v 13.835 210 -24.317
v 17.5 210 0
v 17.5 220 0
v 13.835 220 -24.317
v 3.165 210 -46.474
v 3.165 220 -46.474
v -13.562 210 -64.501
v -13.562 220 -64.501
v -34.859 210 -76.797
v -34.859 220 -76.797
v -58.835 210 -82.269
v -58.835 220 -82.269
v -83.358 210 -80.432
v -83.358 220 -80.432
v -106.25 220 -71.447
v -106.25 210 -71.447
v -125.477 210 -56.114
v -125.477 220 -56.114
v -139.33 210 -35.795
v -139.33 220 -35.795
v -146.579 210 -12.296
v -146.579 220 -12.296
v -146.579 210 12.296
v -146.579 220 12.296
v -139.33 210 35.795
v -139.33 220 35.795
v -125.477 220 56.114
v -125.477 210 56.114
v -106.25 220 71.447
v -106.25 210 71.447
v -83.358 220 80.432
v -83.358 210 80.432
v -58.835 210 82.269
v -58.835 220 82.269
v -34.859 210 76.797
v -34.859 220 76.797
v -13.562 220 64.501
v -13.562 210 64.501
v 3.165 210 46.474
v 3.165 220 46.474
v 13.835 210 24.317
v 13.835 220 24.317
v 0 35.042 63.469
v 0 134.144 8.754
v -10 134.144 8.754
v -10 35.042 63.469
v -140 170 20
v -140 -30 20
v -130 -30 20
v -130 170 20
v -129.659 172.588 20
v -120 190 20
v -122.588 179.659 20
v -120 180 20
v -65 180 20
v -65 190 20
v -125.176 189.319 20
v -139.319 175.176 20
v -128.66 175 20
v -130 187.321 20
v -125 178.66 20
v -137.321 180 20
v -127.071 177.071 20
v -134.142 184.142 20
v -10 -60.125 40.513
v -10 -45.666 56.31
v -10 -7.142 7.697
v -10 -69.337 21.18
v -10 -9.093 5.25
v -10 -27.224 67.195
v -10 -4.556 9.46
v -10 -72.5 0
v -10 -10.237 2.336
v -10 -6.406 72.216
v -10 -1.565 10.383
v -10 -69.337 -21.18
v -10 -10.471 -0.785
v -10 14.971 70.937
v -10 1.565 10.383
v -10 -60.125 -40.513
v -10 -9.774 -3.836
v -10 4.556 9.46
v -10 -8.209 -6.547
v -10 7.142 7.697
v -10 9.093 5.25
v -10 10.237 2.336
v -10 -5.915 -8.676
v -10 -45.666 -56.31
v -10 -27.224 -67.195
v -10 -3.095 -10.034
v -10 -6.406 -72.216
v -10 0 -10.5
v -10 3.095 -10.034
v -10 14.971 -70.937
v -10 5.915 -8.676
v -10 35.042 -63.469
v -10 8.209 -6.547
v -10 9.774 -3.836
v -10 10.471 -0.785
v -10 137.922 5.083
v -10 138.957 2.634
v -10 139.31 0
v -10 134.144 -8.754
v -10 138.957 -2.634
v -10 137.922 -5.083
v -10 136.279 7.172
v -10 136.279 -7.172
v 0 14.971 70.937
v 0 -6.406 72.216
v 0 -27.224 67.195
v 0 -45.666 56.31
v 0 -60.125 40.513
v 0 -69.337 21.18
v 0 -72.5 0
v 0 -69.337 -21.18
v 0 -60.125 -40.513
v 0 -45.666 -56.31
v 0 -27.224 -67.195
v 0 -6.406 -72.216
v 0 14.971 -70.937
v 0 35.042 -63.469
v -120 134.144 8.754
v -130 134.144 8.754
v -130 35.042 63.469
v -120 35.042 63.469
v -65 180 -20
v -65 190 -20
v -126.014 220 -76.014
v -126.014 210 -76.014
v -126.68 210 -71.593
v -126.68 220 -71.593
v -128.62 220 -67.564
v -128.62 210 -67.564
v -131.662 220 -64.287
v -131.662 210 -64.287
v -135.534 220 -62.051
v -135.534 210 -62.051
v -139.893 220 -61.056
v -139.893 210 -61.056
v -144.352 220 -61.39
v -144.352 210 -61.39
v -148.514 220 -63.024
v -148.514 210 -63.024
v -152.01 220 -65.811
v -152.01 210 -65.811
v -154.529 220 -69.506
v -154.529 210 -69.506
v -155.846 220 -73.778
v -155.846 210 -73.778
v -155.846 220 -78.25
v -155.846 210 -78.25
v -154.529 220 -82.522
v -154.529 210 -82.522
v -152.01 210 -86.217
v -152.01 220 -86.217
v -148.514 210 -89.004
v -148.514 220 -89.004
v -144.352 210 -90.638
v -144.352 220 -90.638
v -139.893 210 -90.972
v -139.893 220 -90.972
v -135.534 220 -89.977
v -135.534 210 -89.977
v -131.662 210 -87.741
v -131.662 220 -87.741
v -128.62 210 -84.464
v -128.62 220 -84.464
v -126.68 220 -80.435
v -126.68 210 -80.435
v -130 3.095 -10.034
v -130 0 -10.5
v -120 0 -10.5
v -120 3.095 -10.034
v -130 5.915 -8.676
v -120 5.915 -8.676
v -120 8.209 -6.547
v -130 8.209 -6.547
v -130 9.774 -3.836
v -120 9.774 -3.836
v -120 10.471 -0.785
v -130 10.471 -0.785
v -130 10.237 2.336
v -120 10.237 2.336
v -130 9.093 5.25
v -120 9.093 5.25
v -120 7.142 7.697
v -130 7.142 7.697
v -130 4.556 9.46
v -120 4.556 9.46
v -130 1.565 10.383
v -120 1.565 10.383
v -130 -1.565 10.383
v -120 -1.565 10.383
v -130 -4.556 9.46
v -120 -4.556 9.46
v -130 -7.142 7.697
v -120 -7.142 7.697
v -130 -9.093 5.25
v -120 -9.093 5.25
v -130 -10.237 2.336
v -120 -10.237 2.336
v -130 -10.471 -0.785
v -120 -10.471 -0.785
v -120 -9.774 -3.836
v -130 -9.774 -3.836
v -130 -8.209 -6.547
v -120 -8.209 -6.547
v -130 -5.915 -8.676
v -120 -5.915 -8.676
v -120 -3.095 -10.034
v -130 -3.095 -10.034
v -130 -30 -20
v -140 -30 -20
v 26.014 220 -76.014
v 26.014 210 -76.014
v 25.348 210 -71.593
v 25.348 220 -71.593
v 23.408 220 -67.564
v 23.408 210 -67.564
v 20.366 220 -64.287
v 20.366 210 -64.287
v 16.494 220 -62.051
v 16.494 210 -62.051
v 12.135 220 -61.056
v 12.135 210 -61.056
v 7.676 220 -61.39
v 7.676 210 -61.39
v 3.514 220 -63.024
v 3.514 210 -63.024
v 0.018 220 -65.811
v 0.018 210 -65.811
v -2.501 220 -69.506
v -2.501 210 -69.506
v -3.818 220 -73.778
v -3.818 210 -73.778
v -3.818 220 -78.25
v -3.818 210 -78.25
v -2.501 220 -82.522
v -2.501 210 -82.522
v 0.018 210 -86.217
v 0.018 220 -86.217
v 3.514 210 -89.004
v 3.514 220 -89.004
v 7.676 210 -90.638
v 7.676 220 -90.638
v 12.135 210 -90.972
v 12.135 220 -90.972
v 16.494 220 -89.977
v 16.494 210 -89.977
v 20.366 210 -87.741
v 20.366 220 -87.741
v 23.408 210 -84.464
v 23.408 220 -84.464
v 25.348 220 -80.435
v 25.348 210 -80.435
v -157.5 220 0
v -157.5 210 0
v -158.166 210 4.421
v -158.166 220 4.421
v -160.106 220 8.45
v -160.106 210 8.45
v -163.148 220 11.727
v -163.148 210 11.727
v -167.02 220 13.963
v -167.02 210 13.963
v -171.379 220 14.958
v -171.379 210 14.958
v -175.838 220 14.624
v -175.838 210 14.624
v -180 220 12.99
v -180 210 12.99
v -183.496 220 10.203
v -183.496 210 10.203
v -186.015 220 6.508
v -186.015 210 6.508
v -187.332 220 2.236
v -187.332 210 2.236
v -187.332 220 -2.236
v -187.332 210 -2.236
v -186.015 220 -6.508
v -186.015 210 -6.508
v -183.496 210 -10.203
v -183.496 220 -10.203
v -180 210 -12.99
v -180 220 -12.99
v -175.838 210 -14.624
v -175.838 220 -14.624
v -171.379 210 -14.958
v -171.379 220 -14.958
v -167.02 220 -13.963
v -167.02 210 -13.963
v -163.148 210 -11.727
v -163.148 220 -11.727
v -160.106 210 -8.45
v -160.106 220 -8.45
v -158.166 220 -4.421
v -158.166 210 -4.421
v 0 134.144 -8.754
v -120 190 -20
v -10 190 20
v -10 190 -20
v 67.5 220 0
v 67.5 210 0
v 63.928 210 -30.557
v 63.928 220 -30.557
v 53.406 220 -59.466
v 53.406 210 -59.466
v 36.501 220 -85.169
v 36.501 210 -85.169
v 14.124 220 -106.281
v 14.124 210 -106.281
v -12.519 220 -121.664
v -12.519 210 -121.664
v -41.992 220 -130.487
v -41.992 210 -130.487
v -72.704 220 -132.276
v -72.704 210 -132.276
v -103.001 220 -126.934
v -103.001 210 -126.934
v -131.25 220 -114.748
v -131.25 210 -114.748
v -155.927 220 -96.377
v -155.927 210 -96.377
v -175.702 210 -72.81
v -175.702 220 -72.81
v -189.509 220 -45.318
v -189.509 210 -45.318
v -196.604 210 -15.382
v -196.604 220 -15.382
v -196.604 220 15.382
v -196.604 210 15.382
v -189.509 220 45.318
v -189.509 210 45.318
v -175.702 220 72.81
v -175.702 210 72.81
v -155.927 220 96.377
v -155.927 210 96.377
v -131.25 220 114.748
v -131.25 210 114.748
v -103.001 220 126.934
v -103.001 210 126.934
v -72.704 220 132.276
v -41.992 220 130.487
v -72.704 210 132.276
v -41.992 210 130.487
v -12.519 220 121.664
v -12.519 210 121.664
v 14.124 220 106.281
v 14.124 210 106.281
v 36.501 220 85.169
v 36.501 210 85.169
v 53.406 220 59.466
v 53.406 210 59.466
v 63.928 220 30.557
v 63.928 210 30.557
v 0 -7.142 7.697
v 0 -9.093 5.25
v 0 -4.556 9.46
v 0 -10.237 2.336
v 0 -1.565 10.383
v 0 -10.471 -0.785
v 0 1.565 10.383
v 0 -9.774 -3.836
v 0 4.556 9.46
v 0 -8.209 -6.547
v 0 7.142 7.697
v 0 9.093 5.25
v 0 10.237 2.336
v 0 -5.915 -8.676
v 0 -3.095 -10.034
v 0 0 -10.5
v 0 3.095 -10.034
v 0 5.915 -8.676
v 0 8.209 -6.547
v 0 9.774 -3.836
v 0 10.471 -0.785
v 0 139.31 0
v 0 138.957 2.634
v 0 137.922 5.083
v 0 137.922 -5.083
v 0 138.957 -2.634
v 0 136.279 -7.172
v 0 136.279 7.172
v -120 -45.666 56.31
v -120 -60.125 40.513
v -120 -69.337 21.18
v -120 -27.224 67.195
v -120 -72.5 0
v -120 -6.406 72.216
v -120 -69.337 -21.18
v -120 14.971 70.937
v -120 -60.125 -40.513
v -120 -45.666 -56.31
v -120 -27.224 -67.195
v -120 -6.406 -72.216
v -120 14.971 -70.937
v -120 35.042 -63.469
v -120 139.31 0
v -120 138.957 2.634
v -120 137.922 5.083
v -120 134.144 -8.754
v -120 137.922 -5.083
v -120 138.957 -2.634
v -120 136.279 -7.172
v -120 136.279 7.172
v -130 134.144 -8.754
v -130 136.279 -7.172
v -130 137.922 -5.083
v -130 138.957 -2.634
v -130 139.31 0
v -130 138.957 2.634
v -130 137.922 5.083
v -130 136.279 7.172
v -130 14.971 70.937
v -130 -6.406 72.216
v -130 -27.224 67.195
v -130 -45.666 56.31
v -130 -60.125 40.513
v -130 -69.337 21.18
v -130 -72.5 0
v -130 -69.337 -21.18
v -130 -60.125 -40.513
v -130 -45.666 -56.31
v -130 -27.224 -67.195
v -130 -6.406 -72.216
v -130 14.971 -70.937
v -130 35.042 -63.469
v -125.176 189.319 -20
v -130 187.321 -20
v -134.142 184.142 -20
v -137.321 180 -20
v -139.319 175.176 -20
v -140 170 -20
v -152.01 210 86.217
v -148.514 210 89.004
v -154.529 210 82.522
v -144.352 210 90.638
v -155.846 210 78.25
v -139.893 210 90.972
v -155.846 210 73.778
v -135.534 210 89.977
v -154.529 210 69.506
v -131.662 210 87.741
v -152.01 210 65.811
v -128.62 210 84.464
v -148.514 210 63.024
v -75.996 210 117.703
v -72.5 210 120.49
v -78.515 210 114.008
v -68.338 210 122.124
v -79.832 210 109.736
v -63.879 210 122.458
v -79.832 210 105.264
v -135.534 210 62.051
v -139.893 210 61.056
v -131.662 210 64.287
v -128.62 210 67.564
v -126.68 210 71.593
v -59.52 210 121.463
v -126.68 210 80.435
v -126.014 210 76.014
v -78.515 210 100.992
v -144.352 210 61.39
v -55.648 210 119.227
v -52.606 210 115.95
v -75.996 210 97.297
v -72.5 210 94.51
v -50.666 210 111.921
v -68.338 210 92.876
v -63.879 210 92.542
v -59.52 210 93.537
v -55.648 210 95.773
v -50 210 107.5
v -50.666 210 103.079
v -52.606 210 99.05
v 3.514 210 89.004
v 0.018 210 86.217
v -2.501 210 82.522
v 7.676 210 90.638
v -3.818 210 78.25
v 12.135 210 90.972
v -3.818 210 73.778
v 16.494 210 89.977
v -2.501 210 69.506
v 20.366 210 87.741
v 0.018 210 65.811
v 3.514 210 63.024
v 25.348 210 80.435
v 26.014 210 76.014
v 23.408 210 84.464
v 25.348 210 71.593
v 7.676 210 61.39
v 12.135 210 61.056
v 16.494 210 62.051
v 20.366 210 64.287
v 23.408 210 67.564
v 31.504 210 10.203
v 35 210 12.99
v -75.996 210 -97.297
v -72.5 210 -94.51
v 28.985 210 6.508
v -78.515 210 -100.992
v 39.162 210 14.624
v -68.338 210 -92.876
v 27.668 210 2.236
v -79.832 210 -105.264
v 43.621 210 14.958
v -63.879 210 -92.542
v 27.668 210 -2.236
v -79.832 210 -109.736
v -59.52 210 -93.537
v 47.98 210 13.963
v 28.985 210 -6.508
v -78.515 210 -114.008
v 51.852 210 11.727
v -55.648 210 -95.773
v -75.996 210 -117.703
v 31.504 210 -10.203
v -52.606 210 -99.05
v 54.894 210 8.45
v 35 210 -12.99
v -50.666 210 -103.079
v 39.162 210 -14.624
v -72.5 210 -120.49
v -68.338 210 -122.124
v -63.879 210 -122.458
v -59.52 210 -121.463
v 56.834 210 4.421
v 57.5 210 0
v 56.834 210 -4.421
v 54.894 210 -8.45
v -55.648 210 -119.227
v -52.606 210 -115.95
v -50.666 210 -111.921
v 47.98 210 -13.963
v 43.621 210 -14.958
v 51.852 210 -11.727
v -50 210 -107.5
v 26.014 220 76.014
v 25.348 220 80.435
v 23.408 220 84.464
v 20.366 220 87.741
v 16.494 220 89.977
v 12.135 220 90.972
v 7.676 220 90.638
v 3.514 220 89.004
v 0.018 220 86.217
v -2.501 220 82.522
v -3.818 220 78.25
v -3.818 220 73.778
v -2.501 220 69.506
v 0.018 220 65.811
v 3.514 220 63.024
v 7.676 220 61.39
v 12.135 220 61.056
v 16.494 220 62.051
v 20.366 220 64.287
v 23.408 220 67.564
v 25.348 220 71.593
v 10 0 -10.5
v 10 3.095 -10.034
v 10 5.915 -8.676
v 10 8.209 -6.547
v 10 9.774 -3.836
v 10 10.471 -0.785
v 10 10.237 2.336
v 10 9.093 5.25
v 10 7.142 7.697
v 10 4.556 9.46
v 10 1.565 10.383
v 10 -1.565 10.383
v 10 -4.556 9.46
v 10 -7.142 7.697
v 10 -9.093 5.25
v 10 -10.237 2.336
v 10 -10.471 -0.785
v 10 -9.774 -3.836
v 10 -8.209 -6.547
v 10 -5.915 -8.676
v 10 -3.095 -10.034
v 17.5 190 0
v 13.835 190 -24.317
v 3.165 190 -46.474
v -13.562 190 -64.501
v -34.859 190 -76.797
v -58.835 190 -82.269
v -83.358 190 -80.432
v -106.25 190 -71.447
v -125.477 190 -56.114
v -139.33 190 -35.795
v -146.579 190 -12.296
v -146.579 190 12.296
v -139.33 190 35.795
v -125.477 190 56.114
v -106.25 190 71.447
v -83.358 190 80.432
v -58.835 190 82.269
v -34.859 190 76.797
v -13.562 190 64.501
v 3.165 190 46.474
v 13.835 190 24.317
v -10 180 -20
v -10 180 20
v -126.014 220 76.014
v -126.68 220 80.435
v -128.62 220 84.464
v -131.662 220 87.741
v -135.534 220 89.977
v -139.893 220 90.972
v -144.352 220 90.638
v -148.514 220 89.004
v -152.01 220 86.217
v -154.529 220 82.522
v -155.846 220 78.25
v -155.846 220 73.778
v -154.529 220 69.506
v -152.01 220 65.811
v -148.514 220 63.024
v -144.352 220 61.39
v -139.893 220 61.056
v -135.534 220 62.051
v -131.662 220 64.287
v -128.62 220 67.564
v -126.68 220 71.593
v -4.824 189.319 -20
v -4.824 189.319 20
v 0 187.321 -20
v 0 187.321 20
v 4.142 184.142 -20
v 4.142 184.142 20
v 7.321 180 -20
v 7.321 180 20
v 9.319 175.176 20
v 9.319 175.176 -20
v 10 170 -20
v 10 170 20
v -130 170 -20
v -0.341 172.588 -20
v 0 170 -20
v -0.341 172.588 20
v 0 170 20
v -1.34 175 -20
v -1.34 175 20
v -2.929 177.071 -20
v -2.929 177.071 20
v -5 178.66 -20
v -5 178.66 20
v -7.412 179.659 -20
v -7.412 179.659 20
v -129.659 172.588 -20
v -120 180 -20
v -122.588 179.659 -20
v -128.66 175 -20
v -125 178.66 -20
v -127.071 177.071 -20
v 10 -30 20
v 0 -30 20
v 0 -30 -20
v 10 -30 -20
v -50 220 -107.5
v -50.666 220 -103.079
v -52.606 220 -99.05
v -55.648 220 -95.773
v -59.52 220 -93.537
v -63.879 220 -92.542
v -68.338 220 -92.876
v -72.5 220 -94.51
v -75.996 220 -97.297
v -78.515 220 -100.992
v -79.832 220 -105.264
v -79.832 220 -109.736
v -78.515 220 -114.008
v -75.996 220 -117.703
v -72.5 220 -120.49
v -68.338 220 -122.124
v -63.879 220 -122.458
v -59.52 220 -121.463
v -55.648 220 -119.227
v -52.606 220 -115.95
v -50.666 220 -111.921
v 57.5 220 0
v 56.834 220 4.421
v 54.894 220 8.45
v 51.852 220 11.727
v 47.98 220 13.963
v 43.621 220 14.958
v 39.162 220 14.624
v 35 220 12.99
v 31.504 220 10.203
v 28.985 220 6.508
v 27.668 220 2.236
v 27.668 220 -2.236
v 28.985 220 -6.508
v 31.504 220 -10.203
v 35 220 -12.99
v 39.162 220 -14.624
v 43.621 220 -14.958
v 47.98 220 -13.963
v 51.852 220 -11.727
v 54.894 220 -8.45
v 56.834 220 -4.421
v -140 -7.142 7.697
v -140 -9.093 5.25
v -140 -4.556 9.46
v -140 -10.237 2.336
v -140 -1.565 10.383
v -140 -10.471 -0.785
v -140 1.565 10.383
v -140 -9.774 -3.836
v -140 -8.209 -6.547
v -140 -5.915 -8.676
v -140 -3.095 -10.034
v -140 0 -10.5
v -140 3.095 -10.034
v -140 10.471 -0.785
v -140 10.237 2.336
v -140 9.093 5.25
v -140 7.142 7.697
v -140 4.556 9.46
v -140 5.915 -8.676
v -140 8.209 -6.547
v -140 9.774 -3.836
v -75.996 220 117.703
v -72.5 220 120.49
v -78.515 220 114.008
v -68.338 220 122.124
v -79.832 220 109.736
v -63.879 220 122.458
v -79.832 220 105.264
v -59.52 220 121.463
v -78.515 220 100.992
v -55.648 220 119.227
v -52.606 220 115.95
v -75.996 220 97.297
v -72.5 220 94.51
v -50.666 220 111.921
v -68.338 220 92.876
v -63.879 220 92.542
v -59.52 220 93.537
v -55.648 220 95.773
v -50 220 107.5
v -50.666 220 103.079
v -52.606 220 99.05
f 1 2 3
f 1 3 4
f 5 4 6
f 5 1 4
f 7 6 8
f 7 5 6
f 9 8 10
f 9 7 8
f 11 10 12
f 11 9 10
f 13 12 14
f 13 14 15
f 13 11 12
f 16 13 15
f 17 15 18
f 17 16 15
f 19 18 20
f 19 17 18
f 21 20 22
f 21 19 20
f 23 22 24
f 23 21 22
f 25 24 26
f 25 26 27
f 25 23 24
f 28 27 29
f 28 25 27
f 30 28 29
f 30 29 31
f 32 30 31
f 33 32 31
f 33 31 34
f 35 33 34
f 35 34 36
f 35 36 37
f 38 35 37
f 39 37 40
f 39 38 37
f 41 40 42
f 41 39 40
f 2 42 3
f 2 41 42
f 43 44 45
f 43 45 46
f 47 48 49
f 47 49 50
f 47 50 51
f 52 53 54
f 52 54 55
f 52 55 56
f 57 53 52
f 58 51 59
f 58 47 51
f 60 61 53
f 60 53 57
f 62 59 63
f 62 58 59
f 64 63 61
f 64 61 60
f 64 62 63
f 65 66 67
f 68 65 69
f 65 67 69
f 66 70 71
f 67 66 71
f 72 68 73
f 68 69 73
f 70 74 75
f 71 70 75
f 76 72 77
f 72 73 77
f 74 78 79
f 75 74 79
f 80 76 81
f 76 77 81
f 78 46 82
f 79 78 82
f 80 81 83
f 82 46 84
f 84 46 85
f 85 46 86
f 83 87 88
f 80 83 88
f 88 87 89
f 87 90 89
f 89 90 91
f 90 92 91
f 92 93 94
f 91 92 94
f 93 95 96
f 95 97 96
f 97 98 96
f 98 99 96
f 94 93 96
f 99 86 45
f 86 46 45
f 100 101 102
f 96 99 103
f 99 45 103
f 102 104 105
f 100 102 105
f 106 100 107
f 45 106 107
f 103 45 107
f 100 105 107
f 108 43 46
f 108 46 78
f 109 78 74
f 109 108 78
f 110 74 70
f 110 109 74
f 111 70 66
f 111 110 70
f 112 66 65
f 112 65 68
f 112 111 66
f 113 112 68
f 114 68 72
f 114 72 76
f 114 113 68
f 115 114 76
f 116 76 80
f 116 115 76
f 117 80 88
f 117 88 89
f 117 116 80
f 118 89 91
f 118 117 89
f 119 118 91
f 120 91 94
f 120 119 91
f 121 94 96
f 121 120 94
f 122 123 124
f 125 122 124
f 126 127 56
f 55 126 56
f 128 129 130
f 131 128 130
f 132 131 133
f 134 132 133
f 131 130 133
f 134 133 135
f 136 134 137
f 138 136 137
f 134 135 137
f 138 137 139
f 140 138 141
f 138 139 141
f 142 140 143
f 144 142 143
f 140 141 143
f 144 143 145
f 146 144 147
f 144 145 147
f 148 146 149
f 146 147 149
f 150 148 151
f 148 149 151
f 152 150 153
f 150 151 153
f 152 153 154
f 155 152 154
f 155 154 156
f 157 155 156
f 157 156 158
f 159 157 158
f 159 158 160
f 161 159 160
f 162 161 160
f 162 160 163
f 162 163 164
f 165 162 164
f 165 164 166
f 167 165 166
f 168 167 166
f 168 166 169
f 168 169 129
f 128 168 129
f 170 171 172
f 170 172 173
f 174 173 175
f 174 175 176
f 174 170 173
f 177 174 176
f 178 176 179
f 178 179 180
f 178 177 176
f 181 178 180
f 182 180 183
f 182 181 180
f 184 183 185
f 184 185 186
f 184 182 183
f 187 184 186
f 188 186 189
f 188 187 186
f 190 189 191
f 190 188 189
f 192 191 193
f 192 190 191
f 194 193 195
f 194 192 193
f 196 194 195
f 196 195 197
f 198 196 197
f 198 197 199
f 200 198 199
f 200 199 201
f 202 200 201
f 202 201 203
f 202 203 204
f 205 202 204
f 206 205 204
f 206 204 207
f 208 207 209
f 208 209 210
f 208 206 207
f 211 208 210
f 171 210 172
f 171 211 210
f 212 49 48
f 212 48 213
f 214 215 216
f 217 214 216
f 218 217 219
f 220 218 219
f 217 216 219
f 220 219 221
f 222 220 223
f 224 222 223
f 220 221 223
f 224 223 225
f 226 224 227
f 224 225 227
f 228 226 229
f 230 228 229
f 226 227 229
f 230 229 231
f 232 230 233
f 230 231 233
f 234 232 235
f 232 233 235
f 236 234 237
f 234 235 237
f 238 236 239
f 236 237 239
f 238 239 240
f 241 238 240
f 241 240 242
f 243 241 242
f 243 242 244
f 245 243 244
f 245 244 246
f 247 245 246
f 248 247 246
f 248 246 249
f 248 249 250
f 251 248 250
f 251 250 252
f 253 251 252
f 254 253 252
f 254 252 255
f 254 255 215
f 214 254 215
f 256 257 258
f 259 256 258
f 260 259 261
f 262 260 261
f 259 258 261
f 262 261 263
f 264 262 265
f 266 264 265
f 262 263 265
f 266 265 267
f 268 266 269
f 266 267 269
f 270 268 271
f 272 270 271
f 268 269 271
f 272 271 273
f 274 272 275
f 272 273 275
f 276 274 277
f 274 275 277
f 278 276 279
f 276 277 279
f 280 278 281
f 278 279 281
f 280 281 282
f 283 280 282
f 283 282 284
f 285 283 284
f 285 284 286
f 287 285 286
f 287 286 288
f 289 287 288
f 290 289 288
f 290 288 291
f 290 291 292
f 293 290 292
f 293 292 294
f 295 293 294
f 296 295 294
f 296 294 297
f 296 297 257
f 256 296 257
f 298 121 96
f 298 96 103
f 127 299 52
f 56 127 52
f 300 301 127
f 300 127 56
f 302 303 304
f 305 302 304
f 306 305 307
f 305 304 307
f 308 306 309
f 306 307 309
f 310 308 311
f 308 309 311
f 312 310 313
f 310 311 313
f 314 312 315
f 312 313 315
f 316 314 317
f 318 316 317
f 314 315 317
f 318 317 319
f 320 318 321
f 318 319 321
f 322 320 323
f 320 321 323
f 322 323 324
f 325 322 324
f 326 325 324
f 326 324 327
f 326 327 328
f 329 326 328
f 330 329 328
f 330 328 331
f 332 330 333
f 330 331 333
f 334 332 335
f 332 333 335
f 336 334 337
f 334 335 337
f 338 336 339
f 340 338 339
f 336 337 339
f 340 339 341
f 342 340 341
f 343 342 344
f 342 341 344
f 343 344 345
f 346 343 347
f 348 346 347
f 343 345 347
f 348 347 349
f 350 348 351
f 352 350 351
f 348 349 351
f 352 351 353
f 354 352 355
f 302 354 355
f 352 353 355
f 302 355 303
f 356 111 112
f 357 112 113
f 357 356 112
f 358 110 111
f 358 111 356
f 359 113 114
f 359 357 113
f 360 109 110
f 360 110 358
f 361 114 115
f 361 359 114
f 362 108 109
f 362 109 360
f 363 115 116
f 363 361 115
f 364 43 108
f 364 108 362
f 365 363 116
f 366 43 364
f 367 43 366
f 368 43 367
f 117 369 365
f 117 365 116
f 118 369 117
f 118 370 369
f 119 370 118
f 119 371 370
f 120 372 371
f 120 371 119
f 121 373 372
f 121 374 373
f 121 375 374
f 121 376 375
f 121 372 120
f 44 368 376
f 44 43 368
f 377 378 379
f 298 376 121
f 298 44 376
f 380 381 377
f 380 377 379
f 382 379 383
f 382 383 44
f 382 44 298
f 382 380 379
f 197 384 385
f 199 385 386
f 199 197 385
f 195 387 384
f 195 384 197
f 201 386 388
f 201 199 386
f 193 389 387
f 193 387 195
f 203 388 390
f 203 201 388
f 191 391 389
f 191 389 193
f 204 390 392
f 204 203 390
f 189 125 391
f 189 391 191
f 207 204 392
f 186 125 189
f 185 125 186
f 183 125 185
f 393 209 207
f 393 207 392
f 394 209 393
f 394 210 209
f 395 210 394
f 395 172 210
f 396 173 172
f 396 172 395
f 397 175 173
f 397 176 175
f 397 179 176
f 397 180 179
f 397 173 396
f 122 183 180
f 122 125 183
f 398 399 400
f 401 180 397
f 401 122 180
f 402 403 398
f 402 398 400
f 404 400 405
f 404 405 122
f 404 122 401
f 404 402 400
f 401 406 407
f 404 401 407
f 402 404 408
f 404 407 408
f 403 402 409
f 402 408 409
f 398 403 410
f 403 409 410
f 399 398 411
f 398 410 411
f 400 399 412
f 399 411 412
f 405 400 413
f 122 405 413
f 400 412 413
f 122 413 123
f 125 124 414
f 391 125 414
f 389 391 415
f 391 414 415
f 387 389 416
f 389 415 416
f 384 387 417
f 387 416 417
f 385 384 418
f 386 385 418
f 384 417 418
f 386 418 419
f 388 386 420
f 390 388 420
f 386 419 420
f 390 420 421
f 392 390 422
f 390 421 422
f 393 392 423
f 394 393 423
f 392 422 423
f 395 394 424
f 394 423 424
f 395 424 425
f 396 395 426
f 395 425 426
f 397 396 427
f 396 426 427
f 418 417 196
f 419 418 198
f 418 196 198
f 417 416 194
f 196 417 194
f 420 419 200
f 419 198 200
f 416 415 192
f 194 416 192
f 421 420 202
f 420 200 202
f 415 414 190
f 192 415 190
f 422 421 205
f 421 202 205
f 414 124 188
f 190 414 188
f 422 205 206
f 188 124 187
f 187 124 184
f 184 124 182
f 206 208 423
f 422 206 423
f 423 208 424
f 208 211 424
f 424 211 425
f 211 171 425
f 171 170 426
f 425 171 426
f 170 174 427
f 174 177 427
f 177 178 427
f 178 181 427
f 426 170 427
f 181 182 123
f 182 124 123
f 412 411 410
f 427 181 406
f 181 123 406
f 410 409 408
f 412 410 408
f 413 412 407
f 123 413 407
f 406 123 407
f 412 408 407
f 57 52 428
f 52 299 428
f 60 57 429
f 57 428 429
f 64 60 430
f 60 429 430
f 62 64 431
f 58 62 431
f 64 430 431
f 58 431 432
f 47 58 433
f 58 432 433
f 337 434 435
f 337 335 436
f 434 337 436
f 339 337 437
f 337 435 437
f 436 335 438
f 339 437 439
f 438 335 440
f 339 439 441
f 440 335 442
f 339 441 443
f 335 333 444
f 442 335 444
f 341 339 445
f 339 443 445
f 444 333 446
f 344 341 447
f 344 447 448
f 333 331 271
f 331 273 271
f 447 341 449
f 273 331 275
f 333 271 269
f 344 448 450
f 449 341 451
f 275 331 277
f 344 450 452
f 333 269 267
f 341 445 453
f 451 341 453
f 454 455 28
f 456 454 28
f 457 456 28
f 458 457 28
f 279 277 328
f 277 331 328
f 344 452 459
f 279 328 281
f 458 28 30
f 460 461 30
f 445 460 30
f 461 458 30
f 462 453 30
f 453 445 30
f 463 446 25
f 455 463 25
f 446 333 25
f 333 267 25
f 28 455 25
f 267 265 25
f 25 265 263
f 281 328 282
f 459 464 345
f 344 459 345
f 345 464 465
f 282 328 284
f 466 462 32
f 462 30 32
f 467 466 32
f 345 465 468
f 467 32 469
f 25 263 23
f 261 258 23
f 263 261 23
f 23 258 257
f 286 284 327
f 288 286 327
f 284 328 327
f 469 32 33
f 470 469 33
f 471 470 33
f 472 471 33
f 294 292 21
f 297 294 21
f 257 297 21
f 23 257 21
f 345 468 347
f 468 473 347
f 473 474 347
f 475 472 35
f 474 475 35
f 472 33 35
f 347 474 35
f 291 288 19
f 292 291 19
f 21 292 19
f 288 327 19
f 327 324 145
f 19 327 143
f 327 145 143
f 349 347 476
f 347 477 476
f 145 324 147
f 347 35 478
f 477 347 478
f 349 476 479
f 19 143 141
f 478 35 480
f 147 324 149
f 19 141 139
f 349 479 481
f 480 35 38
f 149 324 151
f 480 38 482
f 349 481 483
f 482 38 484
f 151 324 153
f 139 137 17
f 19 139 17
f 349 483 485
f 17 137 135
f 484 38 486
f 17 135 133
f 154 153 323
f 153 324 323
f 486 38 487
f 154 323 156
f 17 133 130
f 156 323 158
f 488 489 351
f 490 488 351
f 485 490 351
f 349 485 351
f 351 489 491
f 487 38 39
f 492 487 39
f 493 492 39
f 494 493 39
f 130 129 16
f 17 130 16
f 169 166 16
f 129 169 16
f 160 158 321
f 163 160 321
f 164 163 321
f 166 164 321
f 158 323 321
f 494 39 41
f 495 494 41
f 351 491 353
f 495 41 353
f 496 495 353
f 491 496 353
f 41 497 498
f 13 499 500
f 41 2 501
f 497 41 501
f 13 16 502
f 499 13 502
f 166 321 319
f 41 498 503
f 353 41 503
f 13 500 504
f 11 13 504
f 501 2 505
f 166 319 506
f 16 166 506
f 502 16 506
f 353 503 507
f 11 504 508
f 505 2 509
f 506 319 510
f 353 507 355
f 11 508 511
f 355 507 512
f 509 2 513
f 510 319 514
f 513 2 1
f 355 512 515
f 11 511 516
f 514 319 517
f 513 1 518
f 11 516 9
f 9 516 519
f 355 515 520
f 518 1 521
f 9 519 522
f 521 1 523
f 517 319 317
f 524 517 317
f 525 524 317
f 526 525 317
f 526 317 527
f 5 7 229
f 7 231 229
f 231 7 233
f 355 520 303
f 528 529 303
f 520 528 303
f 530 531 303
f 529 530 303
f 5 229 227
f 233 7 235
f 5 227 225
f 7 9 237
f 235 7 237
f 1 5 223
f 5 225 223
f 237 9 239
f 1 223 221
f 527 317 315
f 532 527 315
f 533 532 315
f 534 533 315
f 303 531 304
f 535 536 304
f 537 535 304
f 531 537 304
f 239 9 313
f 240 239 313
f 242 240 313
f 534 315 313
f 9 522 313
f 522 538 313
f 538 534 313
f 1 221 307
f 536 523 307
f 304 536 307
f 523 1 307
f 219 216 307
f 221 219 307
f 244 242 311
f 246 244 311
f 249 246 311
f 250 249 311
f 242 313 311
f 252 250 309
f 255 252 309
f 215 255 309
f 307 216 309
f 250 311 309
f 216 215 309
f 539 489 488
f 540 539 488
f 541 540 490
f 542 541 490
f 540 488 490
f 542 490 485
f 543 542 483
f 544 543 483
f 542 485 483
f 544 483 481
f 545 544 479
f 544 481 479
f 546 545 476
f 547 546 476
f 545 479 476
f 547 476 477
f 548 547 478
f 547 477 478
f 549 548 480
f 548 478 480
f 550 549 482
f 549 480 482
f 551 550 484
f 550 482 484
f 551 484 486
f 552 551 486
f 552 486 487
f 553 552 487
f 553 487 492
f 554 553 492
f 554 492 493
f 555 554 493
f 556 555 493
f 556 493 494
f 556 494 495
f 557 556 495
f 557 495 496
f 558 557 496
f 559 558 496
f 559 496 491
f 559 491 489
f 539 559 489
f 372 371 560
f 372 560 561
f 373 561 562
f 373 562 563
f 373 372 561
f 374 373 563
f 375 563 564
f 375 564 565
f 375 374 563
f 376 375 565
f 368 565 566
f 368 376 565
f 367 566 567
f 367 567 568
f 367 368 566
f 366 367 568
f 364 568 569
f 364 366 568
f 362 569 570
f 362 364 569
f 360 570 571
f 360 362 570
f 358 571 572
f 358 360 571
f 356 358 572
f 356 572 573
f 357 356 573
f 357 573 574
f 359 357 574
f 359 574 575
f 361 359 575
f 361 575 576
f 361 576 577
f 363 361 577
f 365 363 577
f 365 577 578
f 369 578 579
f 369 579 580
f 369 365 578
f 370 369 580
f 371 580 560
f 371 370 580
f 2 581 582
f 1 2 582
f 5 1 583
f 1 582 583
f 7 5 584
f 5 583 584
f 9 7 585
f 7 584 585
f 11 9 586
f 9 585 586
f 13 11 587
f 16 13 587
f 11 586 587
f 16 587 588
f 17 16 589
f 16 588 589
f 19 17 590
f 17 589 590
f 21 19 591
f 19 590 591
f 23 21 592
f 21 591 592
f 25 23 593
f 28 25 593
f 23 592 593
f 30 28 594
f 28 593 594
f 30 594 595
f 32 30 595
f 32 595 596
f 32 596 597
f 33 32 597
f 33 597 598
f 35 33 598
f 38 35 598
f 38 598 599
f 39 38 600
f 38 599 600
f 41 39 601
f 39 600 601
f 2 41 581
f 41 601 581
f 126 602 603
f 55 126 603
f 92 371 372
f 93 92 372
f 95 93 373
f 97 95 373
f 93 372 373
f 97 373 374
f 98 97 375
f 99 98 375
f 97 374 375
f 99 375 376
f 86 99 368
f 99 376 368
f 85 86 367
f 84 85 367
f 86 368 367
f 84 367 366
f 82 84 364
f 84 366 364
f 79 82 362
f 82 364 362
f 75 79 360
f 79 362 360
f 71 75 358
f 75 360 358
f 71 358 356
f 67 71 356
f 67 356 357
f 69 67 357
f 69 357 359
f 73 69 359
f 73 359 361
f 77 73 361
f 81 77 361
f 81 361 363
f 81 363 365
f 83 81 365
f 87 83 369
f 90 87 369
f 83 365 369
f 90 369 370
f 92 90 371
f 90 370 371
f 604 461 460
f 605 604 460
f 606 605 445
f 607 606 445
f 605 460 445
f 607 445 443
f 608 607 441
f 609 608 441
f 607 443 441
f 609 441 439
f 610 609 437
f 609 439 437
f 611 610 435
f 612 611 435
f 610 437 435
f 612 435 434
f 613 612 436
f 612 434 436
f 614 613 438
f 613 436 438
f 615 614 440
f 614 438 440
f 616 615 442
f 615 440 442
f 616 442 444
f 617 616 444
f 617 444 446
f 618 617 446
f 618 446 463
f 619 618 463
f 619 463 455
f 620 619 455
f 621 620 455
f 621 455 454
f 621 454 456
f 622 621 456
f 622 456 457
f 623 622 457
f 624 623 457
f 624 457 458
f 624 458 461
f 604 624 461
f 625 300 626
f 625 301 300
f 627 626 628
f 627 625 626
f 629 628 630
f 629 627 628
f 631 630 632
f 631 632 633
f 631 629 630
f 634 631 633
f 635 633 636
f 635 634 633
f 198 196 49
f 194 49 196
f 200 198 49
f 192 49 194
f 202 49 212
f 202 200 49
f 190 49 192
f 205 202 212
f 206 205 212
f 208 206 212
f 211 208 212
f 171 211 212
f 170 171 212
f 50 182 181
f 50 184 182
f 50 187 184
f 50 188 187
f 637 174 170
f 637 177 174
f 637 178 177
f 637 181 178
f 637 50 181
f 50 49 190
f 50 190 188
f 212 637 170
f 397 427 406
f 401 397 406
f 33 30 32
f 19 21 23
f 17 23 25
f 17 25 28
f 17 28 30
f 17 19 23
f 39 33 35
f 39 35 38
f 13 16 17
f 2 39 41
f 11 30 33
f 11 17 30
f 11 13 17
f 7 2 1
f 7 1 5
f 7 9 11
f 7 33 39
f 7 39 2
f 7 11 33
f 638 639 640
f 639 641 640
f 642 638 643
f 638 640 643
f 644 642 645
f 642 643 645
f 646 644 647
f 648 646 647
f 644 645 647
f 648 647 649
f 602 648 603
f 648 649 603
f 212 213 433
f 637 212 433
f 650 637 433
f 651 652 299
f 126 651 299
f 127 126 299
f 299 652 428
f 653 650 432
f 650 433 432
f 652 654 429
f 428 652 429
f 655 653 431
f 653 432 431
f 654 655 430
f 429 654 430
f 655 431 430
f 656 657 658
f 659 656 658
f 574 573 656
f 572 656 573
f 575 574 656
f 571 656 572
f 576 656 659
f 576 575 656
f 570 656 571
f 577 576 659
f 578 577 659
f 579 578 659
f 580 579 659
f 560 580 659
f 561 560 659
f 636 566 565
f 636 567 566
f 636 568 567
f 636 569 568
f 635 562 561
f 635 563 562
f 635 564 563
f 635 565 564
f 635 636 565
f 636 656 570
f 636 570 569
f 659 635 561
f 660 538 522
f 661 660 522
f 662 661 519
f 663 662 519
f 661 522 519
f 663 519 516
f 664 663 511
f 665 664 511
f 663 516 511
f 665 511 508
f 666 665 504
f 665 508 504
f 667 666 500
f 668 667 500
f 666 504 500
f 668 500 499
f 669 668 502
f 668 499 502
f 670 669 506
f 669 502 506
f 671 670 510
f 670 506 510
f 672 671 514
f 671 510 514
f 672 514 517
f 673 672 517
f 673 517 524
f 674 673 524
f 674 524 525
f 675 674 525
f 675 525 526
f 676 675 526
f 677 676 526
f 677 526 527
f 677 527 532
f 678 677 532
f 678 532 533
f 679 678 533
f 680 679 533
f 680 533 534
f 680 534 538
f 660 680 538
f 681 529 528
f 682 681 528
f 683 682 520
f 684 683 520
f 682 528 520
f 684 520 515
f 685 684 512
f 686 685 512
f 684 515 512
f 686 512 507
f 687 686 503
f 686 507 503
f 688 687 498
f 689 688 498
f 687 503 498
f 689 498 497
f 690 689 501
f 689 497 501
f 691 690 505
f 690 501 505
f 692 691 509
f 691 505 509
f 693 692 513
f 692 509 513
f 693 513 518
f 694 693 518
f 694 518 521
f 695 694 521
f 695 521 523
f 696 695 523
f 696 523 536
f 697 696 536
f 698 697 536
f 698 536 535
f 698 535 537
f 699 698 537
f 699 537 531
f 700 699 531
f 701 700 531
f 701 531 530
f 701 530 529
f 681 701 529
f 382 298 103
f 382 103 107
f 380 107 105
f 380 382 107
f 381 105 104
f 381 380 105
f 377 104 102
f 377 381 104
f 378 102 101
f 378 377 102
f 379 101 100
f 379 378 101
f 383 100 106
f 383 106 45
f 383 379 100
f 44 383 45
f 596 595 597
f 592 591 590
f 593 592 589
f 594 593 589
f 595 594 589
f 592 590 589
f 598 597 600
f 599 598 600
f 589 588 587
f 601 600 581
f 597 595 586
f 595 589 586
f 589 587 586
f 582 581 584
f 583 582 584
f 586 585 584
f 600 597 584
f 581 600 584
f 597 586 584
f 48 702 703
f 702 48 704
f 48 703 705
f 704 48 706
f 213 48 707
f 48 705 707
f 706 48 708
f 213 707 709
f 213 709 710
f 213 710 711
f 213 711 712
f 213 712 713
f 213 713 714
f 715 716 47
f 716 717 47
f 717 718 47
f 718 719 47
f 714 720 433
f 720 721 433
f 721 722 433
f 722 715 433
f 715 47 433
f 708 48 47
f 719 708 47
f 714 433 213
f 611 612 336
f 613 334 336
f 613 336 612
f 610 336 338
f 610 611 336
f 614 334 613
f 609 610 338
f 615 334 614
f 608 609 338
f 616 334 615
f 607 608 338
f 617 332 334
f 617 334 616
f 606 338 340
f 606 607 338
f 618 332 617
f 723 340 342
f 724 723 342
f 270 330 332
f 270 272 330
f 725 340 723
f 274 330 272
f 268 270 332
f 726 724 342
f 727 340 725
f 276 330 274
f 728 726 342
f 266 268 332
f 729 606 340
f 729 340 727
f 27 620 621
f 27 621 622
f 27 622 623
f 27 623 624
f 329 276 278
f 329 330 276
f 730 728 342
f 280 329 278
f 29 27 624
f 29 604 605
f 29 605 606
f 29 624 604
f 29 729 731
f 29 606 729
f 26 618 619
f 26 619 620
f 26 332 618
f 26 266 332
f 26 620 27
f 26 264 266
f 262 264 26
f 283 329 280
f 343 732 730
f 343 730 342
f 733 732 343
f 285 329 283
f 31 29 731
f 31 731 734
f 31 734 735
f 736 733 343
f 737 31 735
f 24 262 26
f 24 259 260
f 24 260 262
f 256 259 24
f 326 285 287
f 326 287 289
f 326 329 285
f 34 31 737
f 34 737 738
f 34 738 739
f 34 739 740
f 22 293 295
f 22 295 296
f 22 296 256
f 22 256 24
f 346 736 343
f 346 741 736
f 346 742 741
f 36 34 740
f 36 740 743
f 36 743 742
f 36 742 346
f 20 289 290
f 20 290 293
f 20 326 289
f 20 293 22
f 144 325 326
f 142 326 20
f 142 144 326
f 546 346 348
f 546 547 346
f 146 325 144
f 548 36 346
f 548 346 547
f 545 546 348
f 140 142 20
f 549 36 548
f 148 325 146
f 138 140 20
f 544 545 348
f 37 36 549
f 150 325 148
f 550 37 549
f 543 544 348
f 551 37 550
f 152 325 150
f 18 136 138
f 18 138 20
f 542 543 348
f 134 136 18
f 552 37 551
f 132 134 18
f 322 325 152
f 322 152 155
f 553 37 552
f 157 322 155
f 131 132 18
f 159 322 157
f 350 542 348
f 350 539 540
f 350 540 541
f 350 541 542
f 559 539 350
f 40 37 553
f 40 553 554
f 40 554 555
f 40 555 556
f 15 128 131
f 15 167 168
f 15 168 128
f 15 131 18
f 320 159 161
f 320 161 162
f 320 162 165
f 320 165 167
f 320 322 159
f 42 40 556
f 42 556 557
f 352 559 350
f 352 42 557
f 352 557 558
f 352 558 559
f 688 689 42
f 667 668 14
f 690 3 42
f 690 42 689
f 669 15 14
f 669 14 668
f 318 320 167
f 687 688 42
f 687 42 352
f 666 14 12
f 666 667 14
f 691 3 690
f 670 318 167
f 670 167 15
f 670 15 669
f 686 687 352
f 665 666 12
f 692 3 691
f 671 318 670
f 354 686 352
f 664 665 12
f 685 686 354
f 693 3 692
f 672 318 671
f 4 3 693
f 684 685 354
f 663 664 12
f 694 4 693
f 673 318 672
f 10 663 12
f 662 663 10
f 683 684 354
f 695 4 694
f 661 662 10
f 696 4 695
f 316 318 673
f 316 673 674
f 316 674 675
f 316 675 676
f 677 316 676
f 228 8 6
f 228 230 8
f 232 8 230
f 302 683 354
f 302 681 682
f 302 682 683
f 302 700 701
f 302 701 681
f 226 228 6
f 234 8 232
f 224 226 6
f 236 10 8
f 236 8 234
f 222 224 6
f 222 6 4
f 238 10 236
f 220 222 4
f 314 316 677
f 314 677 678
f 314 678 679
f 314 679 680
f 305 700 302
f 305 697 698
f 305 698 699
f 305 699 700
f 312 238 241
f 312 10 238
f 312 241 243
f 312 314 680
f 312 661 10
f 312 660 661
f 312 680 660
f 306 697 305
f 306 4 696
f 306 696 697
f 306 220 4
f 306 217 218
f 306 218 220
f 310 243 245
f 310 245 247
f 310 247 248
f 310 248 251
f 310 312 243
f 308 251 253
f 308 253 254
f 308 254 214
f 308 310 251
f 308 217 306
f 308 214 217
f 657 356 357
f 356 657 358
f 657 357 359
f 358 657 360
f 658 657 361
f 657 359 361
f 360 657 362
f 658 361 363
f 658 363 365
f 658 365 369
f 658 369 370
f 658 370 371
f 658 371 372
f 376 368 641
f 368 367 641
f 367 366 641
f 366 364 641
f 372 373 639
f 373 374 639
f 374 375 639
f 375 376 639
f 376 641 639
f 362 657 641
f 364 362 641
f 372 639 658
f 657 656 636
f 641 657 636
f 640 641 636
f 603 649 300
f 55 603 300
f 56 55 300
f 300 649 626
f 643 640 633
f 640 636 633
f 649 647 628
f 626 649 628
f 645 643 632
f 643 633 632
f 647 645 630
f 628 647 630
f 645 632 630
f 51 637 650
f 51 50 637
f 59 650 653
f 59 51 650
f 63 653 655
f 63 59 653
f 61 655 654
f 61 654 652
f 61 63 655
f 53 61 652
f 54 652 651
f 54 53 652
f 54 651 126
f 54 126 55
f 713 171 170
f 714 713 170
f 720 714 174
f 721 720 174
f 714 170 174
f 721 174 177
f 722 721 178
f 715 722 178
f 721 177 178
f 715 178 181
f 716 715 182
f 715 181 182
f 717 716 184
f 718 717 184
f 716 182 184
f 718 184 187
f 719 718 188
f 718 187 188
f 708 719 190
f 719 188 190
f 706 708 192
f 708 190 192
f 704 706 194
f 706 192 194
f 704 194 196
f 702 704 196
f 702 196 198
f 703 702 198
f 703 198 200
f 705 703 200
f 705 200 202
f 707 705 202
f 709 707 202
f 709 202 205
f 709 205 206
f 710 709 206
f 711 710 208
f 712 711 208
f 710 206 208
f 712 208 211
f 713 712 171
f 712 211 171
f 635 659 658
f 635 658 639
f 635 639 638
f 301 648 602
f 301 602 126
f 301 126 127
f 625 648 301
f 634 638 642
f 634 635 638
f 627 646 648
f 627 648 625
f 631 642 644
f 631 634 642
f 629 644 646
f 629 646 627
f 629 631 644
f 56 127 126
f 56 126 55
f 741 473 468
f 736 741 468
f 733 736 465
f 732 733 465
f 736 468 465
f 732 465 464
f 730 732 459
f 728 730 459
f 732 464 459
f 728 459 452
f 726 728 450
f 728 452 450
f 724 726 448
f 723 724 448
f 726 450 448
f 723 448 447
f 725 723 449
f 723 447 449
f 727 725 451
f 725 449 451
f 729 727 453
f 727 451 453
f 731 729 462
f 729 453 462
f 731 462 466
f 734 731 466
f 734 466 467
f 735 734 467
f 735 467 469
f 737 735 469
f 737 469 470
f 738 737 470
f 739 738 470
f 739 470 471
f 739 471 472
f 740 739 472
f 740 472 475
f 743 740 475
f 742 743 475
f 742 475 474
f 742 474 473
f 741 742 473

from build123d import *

# Parameters (mm, degrees)
SKETCH1_R           = 72.5
SKETCH1_R_2         = 10.5
BOSS_EXTRUDE1_DEPTH = 10
SKETCH2_W           = 40
SKETCH2_H           = 220
SKETCH2_R           = 10.5
BOSS_EXTRUDE2_DEPTH = 10
SKETCH3_W           = 40
SKETCH3_H           = 10
BOSS_EXTRUDE3_DEPTH = 65
FILLET1_R           = 10
FILLET2_R           = 20
SKETCH4_R           = 82.5
BOSS_EXTRUDE4_DEPTH = 20
SKETCH5_R           = 132.5
SKETCH5_R_2         = 82.5
BOSS_EXTRUDE5_DEPTH = 10
SKETCH6_R           = 15
CUT_EXTRUDE1_DEPTH  = 11


with BuildPart() as part:
    # Sketch1 → Boss-Extrude1 (new body)
    with BuildSketch(Plane(origin=(0, 0, 0), x_dir=(0, 0, -1), z_dir=(1, 0, 0))):
        with BuildLine():
            Line((-8.754363991, 134.143678161), (-63.469138936, 35.041666667))
            ThreePointArc((-63.469138936, 35.041666667), (0, 72.5), (63.469138936, 35.041666667))
            Line((63.469138936, 35.041666667), (8.754363991, 134.143678161))
            ThreePointArc((8.754363991, 134.143678161), (0, 139.310344828), (-8.754363991, 134.143678161))
        make_face()
        Circle(SKETCH1_R)
        Circle(SKETCH1_R_2, mode=Mode.SUBTRACT)
    extrude(amount=-BOSS_EXTRUDE1_DEPTH)


with BuildPart() as body_2:
    # Sketch2 → Boss-Extrude2 (new body)
    with BuildSketch(Plane(origin=(0, 0, 0), x_dir=(0, 0, -1), z_dir=(1, 0, 0))):
        with Locations((0, 80)):
            Rectangle(SKETCH2_W, SKETCH2_H)
        Circle(SKETCH2_R, mode=Mode.SUBTRACT)
    extrude(amount=BOSS_EXTRUDE2_DEPTH)

    # Sketch3 → Boss-Extrude3 (add)
    with BuildSketch(Plane.ZY):
        with Locations((0, 185)):
            Rectangle(SKETCH3_W, SKETCH3_H)
    extrude(amount=BOSS_EXTRUDE3_DEPTH)

    # Fillet1
    fillet1_edges = [body_2.edges().sort_by_distance(p)[0] for p in [
        (0, 180, 0),
    ]]
    fillet(fillet1_edges, radius=FILLET1_R)

    # Fillet2
    fillet2_edges = [body_2.edges().sort_by_distance(p)[0] for p in [
        (10, 190, 0),
    ]]
    fillet(fillet2_edges, radius=FILLET2_R)


with BuildPart() as body_3:
    # Mirror1: mirrored copy
    add(part.part.mirror(Plane.ZY.offset(65)))


with BuildPart() as body_4:
    # Mirror1 2: mirrored copy
    add(body_2.part.mirror(Plane.ZY.offset(65)))


with BuildPart() as body_5:
    # Sketch4 → Boss-Extrude4 (new body)
    with BuildSketch(Plane(origin=(0, 190, 0), x_dir=(1, 0, 0), z_dir=(0, 1, 0))):
        with Locations((-65, 0)):
            Circle(SKETCH4_R)
    extrude(amount=BOSS_EXTRUDE4_DEPTH)


with BuildPart() as body_6:
    # Sketch5 → Boss-Extrude5 (new body)
    with BuildSketch(Plane(origin=(0, 210, 0), x_dir=(1, 0, 0), z_dir=(0, 1, 0))):
        with Locations((-65, 0)):
            Circle(SKETCH5_R)
        with Locations((-65, 0)):
            Circle(SKETCH5_R_2, mode=Mode.SUBTRACT)
    extrude(amount=BOSS_EXTRUDE5_DEPTH)

    # Sketch6 → Cut-Extrude1 (cut, through all)
    with BuildSketch(Plane.XZ.offset(-210)):
        with Locations((-65, 107.5)):
            Circle(SKETCH6_R)
        with Locations((11.013978978, 76.013978978)):
            Circle(SKETCH6_R)
        with Locations((42.5, 0)):
            Circle(SKETCH6_R)
        with Locations((11.013978978, -76.013978978)):
            Circle(SKETCH6_R)
        with Locations((-65, -107.5)):
            Circle(SKETCH6_R)
        with Locations((-141.013978978, -76.013978978)):
            Circle(SKETCH6_R)
        with Locations((-172.5, 0)):
            Circle(SKETCH6_R)
        with Locations((-141.013978978, 76.013978978)):
            Circle(SKETCH6_R)
    extrude(amount=-CUT_EXTRUDE1_DEPTH, mode=Mode.SUBTRACT)


solid = Compound([part.part, body_2.part, body_3.part, body_4.part, body_5.part, body_6.part])
